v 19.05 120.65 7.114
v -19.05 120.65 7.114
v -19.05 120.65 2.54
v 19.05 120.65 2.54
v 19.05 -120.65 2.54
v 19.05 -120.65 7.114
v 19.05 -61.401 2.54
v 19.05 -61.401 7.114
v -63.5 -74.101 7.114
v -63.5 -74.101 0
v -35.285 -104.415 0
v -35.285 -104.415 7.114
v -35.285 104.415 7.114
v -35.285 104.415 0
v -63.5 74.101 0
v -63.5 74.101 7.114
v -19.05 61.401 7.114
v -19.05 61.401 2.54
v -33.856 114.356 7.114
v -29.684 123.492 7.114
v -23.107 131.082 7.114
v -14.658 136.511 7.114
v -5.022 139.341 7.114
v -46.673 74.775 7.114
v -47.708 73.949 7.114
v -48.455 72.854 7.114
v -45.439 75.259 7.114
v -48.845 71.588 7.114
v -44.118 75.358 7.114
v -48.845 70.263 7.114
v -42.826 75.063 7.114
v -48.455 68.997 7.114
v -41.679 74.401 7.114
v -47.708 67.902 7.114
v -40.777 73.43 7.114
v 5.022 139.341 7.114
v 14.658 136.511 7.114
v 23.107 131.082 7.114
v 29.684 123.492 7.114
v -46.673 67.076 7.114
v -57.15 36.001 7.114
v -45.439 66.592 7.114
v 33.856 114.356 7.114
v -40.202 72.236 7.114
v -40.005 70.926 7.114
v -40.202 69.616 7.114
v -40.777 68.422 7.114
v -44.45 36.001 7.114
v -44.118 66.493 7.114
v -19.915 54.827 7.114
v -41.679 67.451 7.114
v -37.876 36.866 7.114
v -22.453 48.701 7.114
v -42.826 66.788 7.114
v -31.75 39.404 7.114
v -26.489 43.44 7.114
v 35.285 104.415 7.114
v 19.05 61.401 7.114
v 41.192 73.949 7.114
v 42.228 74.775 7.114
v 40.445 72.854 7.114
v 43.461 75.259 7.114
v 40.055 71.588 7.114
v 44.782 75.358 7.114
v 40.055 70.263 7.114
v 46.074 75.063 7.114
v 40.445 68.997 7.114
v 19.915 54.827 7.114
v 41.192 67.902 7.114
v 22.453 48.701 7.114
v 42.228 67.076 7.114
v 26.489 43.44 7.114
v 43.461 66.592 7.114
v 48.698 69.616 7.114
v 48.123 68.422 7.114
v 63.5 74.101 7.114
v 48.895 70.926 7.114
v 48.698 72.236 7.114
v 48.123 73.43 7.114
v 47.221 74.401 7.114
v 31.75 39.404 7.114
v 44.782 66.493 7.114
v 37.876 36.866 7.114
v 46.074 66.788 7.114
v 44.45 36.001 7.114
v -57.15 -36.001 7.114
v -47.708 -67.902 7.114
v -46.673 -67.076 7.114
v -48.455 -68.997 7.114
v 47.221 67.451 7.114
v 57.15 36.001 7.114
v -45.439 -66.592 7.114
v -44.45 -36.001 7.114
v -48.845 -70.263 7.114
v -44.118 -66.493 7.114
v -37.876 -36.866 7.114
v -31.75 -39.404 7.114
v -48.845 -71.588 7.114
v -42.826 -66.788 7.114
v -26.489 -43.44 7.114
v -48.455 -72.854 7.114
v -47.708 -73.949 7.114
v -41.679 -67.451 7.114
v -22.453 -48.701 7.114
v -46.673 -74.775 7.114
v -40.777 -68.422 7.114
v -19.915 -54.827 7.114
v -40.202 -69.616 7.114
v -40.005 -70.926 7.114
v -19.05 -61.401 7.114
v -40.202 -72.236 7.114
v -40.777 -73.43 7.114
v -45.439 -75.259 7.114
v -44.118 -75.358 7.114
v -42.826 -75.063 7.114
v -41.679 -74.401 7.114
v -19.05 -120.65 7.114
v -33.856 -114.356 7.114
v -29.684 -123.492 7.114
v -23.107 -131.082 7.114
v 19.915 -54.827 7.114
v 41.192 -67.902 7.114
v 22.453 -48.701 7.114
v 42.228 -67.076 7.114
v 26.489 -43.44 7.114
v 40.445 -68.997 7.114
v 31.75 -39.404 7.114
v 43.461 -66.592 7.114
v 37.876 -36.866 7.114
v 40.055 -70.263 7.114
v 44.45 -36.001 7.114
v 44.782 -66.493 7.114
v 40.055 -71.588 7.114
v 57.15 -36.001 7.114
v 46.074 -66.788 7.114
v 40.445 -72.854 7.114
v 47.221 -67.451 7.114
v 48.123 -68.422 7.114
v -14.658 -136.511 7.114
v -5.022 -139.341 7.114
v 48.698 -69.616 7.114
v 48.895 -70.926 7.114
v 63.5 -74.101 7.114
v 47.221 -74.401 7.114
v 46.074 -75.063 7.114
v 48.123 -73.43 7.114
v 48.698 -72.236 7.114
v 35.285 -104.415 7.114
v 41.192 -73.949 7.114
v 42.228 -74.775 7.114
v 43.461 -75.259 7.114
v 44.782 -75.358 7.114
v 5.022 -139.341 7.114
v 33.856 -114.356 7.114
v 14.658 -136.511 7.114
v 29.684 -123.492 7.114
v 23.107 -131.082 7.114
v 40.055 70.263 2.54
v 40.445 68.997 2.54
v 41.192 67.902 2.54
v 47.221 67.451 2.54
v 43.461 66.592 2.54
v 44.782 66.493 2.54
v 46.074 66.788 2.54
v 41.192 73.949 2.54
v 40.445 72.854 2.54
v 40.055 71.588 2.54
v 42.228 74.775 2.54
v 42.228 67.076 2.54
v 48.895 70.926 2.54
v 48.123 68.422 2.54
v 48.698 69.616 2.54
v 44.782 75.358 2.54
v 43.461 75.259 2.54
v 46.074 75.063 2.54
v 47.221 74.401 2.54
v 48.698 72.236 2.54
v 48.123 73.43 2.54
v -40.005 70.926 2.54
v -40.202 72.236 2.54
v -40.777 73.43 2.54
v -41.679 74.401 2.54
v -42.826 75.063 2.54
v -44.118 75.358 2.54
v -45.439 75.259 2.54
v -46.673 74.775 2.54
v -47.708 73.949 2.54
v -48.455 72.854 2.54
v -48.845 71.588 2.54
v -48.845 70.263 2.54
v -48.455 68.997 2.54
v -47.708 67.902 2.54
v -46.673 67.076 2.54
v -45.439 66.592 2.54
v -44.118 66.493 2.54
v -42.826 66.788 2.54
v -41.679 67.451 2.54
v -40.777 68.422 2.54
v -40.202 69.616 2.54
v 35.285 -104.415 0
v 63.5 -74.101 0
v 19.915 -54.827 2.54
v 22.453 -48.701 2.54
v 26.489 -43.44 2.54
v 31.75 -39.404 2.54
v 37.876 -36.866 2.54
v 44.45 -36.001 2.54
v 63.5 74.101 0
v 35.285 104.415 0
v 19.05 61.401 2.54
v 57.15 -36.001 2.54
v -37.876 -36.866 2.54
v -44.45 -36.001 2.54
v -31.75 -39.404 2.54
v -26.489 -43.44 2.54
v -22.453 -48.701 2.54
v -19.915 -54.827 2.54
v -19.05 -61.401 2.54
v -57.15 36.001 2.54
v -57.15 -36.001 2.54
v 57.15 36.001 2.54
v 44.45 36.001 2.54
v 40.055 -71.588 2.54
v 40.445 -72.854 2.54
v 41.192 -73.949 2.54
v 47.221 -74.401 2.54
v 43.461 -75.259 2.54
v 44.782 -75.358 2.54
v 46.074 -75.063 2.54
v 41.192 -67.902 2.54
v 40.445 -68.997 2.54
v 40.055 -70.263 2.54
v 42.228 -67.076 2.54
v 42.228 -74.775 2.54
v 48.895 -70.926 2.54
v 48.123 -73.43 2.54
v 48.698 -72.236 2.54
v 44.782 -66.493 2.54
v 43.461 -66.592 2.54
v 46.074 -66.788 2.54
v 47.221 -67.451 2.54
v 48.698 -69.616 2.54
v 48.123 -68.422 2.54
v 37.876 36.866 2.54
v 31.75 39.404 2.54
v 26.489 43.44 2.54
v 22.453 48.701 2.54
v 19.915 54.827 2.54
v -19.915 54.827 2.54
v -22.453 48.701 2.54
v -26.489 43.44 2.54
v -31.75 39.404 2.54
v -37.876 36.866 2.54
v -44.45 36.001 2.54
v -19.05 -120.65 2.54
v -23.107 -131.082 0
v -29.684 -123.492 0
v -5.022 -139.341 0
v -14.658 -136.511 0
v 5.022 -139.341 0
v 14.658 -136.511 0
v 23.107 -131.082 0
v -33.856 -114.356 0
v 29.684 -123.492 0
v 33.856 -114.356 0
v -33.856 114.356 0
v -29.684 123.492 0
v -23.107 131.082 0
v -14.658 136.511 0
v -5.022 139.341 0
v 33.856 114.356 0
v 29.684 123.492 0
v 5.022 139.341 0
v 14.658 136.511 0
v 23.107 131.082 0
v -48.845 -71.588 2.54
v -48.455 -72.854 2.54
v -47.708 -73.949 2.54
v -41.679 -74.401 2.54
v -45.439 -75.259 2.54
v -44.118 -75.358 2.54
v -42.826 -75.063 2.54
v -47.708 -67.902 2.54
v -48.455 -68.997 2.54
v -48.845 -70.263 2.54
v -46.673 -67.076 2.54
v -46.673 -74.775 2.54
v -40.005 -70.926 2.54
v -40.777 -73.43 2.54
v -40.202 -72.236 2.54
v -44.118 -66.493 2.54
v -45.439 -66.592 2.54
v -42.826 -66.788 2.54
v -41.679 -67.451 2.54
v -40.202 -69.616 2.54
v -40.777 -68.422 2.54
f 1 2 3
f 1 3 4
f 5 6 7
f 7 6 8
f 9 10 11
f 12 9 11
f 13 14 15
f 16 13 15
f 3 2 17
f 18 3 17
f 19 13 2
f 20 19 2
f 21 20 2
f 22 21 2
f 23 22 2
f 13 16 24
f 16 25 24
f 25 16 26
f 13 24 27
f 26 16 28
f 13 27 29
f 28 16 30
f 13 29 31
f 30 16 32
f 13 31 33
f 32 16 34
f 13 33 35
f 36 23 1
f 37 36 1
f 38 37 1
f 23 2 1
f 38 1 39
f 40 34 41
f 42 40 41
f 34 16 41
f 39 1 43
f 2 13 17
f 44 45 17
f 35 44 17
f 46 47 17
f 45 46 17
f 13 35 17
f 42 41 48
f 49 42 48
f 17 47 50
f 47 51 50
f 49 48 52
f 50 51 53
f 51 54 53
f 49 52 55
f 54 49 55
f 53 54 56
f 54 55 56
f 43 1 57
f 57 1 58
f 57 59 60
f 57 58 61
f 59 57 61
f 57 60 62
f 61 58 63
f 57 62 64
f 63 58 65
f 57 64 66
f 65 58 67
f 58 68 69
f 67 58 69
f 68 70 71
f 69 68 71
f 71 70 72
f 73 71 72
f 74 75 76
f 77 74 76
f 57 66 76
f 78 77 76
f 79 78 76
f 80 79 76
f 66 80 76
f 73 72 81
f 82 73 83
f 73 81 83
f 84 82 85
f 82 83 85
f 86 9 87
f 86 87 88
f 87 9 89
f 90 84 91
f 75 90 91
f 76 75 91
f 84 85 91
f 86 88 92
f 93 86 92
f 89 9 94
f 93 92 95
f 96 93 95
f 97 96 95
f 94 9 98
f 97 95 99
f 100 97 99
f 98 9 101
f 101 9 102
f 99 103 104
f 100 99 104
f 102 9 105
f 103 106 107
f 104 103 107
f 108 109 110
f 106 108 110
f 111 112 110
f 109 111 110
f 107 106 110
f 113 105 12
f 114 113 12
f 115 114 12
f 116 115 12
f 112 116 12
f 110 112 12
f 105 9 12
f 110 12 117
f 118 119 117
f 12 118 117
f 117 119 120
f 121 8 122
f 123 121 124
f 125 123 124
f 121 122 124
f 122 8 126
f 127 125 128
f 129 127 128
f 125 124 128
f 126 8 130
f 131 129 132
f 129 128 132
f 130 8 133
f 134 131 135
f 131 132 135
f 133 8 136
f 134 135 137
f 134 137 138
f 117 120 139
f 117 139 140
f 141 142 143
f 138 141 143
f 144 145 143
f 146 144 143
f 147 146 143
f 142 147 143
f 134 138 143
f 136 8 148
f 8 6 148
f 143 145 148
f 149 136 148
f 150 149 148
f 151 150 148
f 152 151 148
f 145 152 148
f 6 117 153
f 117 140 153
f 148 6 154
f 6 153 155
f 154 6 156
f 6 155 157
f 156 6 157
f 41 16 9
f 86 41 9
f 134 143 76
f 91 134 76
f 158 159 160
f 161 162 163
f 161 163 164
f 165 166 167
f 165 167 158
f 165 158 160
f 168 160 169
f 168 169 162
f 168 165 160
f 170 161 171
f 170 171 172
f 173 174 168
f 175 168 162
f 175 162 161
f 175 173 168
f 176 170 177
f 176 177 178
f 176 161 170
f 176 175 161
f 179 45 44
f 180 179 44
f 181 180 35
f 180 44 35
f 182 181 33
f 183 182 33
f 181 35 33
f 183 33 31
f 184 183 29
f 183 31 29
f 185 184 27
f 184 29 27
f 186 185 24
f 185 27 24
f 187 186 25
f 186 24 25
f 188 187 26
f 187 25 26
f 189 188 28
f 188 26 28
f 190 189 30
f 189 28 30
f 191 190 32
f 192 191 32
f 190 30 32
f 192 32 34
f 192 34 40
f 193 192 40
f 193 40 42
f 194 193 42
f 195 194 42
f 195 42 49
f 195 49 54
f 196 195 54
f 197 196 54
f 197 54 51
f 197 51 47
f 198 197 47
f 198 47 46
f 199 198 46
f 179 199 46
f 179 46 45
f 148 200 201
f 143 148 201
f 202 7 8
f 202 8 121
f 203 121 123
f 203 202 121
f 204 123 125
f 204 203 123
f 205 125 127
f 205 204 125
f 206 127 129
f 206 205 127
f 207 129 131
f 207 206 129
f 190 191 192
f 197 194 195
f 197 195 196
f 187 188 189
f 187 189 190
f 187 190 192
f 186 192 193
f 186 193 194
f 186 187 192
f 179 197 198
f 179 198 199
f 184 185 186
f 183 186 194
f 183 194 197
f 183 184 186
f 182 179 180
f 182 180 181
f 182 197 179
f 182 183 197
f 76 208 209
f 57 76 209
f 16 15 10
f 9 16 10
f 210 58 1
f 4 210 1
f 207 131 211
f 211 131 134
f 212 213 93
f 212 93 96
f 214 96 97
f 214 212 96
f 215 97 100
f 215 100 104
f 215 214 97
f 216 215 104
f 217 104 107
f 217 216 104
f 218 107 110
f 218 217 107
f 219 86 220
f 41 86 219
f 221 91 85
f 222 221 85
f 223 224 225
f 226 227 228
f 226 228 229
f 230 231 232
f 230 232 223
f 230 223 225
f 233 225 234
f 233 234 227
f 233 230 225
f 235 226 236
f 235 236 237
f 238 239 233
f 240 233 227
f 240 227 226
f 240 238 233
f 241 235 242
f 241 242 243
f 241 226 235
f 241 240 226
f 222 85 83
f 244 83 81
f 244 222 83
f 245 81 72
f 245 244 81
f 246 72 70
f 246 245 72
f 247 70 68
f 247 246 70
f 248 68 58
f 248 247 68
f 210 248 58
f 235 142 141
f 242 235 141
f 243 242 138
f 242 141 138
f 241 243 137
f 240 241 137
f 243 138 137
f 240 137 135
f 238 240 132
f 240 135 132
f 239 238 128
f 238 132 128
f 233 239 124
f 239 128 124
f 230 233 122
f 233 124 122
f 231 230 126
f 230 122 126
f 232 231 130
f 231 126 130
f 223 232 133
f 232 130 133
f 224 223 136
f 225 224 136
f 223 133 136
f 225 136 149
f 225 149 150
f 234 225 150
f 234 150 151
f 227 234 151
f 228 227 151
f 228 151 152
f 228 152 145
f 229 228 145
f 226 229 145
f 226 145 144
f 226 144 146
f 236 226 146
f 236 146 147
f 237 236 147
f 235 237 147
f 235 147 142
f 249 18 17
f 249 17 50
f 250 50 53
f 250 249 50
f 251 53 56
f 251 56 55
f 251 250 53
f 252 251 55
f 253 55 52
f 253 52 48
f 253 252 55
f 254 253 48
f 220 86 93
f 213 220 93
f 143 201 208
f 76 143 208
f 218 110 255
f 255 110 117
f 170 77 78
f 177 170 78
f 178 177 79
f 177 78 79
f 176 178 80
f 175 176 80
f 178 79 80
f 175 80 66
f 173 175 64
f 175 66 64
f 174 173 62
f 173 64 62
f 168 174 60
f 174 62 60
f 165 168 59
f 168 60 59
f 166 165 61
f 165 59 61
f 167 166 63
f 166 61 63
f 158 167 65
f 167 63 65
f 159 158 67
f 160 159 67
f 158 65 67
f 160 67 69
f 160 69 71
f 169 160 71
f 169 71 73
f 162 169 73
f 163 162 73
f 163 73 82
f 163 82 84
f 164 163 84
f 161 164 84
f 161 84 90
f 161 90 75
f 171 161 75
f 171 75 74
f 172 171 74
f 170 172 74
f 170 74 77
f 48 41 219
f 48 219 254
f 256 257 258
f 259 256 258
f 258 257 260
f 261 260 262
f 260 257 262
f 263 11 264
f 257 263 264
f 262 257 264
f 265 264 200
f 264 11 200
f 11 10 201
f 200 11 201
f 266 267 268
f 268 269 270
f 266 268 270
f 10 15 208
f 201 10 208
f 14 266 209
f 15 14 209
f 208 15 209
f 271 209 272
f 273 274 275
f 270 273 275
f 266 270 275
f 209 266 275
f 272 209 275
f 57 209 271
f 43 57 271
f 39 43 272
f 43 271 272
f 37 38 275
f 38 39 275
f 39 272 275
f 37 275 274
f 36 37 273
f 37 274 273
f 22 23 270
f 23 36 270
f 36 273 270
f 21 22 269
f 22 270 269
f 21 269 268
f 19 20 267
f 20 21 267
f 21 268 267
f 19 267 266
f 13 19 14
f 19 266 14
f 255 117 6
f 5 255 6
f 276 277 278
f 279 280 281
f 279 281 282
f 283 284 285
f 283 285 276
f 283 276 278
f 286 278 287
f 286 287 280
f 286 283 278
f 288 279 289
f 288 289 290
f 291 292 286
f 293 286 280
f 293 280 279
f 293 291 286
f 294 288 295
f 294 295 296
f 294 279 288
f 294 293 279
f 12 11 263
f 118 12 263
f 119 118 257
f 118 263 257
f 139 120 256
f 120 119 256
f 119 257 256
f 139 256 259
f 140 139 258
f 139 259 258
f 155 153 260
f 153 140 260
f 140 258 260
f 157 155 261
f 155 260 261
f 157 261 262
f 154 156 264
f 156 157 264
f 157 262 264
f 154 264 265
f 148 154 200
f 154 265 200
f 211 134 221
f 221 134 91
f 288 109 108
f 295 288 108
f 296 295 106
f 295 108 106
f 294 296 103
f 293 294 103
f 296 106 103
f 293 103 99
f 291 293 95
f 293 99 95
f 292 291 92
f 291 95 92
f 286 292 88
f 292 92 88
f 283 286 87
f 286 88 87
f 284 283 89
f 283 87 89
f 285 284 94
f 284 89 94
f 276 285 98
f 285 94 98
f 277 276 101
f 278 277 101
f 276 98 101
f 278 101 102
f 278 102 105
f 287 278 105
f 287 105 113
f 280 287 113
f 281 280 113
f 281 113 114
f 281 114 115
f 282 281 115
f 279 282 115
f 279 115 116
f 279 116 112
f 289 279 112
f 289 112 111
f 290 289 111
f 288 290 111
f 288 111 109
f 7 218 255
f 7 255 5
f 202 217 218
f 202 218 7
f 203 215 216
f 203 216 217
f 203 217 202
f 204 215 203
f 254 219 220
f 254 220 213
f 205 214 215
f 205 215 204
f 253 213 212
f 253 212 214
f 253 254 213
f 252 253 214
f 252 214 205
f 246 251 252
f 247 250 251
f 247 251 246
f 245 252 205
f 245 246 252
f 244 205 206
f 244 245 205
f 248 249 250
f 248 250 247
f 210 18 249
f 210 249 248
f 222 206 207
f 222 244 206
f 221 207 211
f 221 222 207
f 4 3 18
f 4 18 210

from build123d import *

# Parameters (mm, degrees)
F1_DEPTH      = 50.8
F2_W          = 31.75
F2_H          = 35.56
F2_W_2        = 25.4
F3_DEPTH      = 38.1
F4_W          = 31.75
F4_H          = 35.56
F4_W_2        = 25.4
F5_DEPTH      = 38.1
F6_R          = 4.445
F7_DEPTH      = 43.181
F7_DEPTH_BACK = 5.08
F8_W          = 38.1
F8_H          = 72.0014913142
F8_H_2        = 84.6492543429
F9_DEPTH      = 48.26
F10_R         = 25.4
F11_W         = 133.5816735625
F11_H         = 43.6864450194
F12_DEPTH     = 176.022


with BuildPart() as f1:
    # F0 (on Top) → F1 (new body)
    with BuildSketch(Plane.XY):
        with BuildLine():
            Line((63.5, 74.1007456571), (18.0570790654, 74.1007456571))
            ThreePointArc((18.0570790654, 74.1007456571), (0, 69.1302912268), (-18.0570790654, 74.1007456571))
            Line((-18.0570790654, 74.1007456571), (-63.5, 74.1007456571))
            Line((-63.5, 74.1007456571), (-63.5, 0))
            Line((-63.5, 0), (63.5, 0))
            Line((63.5, 0), (63.5, 74.1007456571))
        make_face()
        with BuildLine():
            Line((63.5, -74.1007456571), (63.5, 0))
            Line((63.5, 0), (-63.5, 0))
            Line((-63.5, 0), (-63.5, -74.1007456571))
            Line((-63.5, -74.1007456571), (-18.0570790654, -74.1007456571))
            ThreePointArc((-18.0570790654, -74.1007456571), (0, -69.1302912268), (18.0570790654, -74.1007456571))
            Line((18.0570790654, -74.1007456571), (63.5, -74.1007456571))
        make_face()
        with BuildLine():
            ThreePointArc((35.2848543866, -104.4151456134), (30.6770464236, -86.9812770867), (18.0570790654, -74.1007456571))
            ThreePointArc((18.0570790654, -74.1007456571), (0, -69.1302912268), (-18.0570790654, -74.1007456571))
            ThreePointArc((-18.0570790654, -74.1007456571), (-30.6770464236, -86.9812770867), (-35.2848543866, -104.4151456134))
            ThreePointArc((-35.2848543866, -104.4151456134), (0, -139.7), (35.2848543866, -104.4151456134))
        make_face()
        with BuildLine():
            Line((-18.0570790654, -74.1007456571), (-63.5, -74.1007456571))
            Line((-63.5, -74.1007456571), (-35.2848543866, -104.4151456134))
            ThreePointArc((-35.2848543866, -104.4151456134), (-30.6770464236, -86.9812770867), (-18.0570790654, -74.1007456571))
        make_face()
        with BuildLine():
            Line((35.2848543866, -104.4151456134), (63.5, -74.1007456571))
            Line((63.5, -74.1007456571), (18.0570790654, -74.1007456571))
            ThreePointArc((18.0570790654, -74.1007456571), (30.6770464236, -86.9812770867), (35.2848543866, -104.4151456134))
        make_face()
        with BuildLine():
            ThreePointArc((18.0570790654, 74.1007456571), (30.6770464236, 86.9812770867), (35.2848543866, 104.4151456134))
            ThreePointArc((35.2848543866, 104.4151456134), (0, 139.7), (-35.2848543866, 104.4151456134))
            ThreePointArc((-35.2848543866, 104.4151456134), (-30.6770464236, 86.9812770867), (-18.0570790654, 74.1007456571))
            ThreePointArc((-18.0570790654, 74.1007456571), (0, 69.1302912268), (18.0570790654, 74.1007456571))
        make_face()
        with BuildLine():
            Line((63.5, 74.1007456571), (35.2848543866, 104.4151456134))
            ThreePointArc((35.2848543866, 104.4151456134), (30.6770464236, 86.9812770867), (18.0570790654, 74.1007456571))
            Line((18.0570790654, 74.1007456571), (63.5, 74.1007456571))
        make_face()
        with BuildLine():
            ThreePointArc((-18.0570790654, 74.1007456571), (-30.6770464236, 86.9812770867), (-35.2848543866, 104.4151456134))
            Line((-35.2848543866, 104.4151456134), (-63.5, 74.1007456571))
            Line((-63.5, 74.1007456571), (-18.0570790654, 74.1007456571))
        make_face()
    extrude(amount=F1_DEPTH)

    # F2 (on face) → F3 (cut)
    with BuildSketch(Plane.YZ.offset(63.5)):
        with Locations((-58.2257456571, 25.4)):
            Rectangle(F2_W, F2_H)
        with Locations((-86.8007456571, 25.4)):
            Rectangle(F2_W_2, F2_H)
        with Locations((86.8007456571, 25.4)):
            Rectangle(F2_W_2, F2_H)
        with Locations((58.2257456571, 25.4)):
            Rectangle(F2_W, F2_H)
    extrude(amount=-F3_DEPTH, mode=Mode.SUBTRACT)

    # F4 (on face) → F5 (cut)
    with BuildSketch(Plane(origin=(-63.5, 0, 0), x_dir=(0, -1, 0), z_dir=(-1, 0, 0))):
        with Locations((-58.2257456571, 25.4)):
            Rectangle(F4_W, F4_H)
        with Locations((-86.8007456571, 25.4)):
            Rectangle(F4_W_2, F4_H)
        with Locations((58.2257456571, 25.4)):
            Rectangle(F4_W, F4_H)
        with Locations((86.8007456571, 25.4)):
            Rectangle(F4_W_2, F4_H)
    extrude(amount=-F5_DEPTH, mode=Mode.SUBTRACT)

    # F6 (on face) → F7 (cut, two sides)
    with BuildSketch(Plane.XY.offset(7.62)) as f7_sk:
        with Locations((-44.45, 70.9257456571)):
            Circle(F6_R)
        with Locations((-44.45, -70.9257456571)):
            Circle(F6_R)
        with Locations((44.45, 70.9257456571)):
            Circle(F6_R)
        with Locations((44.45, -70.9257456571)):
            Circle(F6_R)
    extrude(amount=F7_DEPTH, mode=Mode.SUBTRACT)
    extrude(f7_sk.sketch, amount=-F7_DEPTH_BACK, mode=Mode.SUBTRACT)

    # F8 (on face) → F9 (cut)
    with BuildSketch(Plane.XY.offset(50.8)):
        Rectangle(F8_W, F8_H)
        with Locations((38.1, 0)):
            Rectangle(F8_W, F8_H)
        with Locations((0, -78.3253728285)):
            Rectangle(F8_W, F8_H_2)
        with Locations((0, 78.3253728285)):
            Rectangle(F8_W, F8_H_2)
        with Locations((-38.1, 0)):
            Rectangle(F8_W, F8_H)
    extrude(amount=-F9_DEPTH, mode=Mode.SUBTRACT)

    # F10
    f10_edges = [f1.edges().sort_by_distance(p)[0] for p in [
        (-25.4, 42.350746, 25.4),
        (-25.4, -42.350746, 25.4),
        (25.4, -42.350746, 25.4),
        (25.4, 42.350746, 25.4),
        (19.05, -36.000746, 26.67),
        (-19.05, -36.000746, 26.67),
        (19.05, 36.000746, 26.67),
        (-19.05, 36.000746, 26.67),
    ]]
    fillet(f10_edges, radius=F10_R)

    # F11 (on Front) → F12 (cut, symmetric)
    with BuildSketch(Plane.XZ):
        with Locations((3.2908367813, 28.9567774903)):
            Rectangle(F11_W, F11_H)
    extrude(amount=F12_DEPTH, both=True, mode=Mode.SUBTRACT)


solid = f1.part
